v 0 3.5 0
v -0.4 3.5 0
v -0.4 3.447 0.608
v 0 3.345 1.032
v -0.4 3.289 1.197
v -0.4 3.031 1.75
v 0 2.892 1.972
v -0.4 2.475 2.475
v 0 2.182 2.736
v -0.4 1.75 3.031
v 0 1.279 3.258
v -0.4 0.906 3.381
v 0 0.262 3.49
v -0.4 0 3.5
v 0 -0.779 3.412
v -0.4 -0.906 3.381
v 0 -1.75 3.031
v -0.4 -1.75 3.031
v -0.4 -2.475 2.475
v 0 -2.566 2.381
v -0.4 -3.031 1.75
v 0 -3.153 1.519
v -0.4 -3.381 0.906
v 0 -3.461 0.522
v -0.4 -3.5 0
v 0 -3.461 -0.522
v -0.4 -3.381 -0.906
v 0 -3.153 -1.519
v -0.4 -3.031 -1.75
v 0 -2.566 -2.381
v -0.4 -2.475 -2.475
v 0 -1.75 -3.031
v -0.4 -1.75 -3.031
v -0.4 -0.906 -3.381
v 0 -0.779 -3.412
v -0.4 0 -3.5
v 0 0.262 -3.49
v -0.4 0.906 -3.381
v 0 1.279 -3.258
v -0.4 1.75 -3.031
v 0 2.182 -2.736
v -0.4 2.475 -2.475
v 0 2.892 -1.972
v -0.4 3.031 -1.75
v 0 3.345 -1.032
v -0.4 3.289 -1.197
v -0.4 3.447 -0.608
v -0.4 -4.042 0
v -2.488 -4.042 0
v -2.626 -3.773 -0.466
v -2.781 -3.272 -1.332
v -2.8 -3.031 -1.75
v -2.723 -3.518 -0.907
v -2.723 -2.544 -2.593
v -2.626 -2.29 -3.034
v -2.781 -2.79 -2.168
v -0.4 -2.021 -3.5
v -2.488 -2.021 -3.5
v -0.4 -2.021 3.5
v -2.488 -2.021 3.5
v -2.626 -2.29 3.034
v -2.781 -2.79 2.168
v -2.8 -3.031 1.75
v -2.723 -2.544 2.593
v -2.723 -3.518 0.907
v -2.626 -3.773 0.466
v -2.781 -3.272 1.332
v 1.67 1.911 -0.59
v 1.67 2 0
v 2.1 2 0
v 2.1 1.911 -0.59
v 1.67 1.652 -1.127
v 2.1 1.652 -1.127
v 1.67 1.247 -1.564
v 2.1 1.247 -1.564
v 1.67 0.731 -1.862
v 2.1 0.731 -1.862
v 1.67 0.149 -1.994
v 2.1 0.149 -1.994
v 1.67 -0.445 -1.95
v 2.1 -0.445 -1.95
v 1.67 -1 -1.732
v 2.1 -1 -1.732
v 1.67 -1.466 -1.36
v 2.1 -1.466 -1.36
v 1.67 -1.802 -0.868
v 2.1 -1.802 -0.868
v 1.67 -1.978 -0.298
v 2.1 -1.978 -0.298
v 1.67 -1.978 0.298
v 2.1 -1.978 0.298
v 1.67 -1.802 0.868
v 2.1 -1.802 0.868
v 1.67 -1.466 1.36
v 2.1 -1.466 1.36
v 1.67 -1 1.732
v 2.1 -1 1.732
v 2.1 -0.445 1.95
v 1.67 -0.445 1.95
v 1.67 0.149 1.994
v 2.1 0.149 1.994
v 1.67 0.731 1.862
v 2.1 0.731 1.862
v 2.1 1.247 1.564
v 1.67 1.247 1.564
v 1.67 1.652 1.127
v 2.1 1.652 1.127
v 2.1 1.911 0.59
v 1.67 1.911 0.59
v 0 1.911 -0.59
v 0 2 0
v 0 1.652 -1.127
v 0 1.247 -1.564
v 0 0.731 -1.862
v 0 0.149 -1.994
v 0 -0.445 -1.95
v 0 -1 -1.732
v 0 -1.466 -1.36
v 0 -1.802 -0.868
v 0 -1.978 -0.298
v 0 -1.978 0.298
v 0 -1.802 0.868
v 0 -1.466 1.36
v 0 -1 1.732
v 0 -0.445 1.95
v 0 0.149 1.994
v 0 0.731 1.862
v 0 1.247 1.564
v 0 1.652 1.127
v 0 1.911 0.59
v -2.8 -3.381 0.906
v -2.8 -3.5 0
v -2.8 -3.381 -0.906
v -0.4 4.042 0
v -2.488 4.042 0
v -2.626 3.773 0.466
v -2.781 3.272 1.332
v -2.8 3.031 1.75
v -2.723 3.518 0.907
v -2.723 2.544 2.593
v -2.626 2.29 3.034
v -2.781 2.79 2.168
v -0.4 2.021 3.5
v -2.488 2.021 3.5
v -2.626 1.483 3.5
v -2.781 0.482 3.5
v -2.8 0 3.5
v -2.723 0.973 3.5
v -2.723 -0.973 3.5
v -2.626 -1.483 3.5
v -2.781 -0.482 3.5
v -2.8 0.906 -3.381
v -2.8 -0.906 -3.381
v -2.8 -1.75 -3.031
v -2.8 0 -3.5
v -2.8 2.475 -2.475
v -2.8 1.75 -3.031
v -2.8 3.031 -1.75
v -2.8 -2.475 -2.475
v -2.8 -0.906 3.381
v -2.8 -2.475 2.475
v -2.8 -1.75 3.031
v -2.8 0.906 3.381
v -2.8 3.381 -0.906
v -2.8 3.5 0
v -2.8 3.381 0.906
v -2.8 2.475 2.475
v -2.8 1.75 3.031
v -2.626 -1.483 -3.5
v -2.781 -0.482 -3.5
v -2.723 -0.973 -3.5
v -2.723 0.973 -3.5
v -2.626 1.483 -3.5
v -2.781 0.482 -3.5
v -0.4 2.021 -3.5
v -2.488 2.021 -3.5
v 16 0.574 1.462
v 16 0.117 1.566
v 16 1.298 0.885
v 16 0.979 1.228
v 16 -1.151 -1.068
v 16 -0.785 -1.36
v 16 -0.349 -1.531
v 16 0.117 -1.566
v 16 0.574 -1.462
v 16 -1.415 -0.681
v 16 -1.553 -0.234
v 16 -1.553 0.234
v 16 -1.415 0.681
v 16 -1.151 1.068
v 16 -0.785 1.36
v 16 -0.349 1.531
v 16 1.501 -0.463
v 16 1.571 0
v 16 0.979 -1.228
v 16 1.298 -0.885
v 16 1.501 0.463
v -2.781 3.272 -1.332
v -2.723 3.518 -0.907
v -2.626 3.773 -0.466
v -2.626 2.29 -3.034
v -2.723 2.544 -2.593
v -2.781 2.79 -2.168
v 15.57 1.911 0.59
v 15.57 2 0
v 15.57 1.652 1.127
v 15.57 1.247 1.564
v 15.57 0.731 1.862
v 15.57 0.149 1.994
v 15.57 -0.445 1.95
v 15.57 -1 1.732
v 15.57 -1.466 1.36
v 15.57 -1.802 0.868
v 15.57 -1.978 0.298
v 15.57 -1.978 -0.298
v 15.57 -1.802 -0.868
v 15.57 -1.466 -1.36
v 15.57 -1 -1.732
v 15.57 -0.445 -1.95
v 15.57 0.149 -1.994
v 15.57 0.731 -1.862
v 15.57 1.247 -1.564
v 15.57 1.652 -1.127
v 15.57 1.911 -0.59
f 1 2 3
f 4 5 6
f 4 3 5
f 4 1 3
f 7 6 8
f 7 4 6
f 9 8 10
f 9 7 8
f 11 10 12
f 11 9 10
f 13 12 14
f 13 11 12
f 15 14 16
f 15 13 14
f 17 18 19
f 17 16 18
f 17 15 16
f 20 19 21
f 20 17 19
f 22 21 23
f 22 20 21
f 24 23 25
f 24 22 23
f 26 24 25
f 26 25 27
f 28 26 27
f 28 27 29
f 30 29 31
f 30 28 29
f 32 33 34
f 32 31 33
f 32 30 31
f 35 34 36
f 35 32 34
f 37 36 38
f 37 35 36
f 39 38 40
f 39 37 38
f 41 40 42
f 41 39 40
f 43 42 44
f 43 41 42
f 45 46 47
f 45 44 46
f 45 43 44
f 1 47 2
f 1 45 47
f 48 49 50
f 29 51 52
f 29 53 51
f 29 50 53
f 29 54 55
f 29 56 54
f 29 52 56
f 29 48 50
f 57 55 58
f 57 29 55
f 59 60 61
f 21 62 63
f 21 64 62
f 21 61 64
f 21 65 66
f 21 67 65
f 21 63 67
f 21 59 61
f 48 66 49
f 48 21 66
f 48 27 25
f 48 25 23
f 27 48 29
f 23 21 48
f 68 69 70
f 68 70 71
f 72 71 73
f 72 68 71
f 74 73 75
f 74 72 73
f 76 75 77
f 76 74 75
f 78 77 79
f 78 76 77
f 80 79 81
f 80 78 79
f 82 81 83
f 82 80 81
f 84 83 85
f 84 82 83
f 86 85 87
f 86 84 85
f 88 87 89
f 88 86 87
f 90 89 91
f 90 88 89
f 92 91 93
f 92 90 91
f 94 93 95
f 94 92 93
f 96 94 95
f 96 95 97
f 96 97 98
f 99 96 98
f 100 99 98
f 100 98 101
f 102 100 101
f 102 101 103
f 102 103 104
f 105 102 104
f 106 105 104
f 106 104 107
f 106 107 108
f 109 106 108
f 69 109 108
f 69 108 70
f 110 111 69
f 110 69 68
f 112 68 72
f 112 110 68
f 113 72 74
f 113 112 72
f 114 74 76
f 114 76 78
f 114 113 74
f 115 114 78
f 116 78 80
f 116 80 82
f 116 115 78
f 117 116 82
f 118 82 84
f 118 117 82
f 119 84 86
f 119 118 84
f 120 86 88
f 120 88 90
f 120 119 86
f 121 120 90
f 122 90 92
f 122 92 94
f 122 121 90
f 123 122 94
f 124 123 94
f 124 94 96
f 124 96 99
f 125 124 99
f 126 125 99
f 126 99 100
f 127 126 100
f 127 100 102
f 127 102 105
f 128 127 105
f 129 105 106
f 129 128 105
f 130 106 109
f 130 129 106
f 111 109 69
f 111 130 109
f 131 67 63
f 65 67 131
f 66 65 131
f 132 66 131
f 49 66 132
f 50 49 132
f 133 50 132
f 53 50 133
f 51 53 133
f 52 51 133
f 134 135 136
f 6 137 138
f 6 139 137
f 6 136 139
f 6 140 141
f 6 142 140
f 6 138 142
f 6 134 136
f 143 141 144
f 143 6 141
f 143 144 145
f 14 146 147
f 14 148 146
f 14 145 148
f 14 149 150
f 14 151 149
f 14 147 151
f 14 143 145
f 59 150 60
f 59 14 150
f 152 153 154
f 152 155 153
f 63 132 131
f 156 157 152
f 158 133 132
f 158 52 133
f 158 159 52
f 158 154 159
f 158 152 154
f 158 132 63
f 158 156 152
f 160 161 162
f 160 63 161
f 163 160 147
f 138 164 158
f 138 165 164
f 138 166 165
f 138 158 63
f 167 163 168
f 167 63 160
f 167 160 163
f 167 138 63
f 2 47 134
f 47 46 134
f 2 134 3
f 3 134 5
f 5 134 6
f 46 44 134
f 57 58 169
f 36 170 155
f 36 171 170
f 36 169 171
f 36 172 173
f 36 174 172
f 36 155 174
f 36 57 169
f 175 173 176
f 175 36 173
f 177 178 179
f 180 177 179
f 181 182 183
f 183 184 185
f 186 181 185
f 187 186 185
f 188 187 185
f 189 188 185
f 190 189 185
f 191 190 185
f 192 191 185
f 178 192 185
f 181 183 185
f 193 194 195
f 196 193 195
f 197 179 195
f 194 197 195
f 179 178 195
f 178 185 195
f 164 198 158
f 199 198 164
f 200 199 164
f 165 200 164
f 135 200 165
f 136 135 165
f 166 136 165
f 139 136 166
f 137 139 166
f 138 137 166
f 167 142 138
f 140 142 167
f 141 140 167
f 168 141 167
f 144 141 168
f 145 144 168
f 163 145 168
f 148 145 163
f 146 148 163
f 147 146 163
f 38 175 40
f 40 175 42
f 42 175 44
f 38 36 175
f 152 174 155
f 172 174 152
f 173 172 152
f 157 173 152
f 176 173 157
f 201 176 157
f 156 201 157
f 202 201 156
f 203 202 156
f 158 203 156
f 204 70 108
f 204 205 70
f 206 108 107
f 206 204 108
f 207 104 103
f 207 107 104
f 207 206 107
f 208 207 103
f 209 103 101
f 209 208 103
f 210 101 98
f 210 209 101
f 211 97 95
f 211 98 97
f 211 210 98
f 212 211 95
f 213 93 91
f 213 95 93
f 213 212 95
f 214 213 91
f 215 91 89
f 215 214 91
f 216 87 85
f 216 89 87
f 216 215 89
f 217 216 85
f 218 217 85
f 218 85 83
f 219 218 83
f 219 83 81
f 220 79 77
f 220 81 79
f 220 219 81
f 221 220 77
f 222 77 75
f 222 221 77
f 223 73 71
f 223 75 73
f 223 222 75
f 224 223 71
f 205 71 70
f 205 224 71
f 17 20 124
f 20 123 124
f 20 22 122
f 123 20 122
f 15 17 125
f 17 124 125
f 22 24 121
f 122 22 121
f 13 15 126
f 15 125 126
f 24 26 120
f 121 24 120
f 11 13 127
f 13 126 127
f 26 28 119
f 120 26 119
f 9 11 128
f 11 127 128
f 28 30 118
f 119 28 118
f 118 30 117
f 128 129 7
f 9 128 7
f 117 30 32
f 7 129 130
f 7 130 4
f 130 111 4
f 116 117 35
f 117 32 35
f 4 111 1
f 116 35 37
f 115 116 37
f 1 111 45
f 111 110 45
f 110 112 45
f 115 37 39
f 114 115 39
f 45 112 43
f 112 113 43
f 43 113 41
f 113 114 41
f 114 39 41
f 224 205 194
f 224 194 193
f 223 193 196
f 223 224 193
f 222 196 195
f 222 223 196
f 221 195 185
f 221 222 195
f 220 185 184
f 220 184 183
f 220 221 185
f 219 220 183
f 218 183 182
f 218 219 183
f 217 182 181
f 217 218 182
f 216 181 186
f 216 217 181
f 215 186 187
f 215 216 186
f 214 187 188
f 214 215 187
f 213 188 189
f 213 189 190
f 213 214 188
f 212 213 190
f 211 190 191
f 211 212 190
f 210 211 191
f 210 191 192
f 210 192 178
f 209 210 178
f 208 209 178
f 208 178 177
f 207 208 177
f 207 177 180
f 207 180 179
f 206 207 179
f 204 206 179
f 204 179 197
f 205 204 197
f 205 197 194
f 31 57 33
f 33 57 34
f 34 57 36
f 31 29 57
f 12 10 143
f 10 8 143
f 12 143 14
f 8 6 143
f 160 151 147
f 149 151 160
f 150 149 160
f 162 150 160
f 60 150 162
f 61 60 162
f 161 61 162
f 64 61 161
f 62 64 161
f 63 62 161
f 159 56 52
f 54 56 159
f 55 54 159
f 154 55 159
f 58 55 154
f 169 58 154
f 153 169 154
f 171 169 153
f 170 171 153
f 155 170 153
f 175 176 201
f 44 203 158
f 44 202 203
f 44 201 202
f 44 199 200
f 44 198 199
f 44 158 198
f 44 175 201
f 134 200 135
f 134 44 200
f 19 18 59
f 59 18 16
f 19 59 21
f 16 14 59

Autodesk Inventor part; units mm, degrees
ref_plane "YZ Plane" through (0, 0, 0) normal (1, 0, 0) x (0, 1, 0)
ref_plane "XZ Plane" through (0, 0, 0) normal (0, 1, 0) x (-1, 0, 0)
sketch "Sketch1" plane through (0, 0, 0) normal (0, 0, 1) x (1, 0, 0)
  line L0 (0, 3.5) -> (0, 2)
  line L1 (2.1, 2) -> (16, 2)
  line L2 (16, 2) -> (16, 0)
  line L3 (16, 0) -> (-0.4001, 0)
  line L4 (-3.6801, 0) -> (19.28, 0) projected
  line L5 (-0.4001, 0) -> (-0.4001, 3.5)
  line L6 (-0.4001, 3.5) -> (0, 3.5)
  line L7 (2.1, 2) -> (1.6705, 2)
  line L8 (1.6705, 2) -> (0, 2)
  line L9 (0, -0.7) -> (0, 4.2) projected
  dimension "d0" = 16
  dimension "d1" = 13.9
  dimension "d2" = 4
  dimension "d9" = 0.4001
  dimension "d10" = 7
  dimension "d13" = 0.4295
  dimension "d14" = 4
revolve "Body" add sketch "Sketch1" angle 360 about axis through (16, 0, 0) along (-1, 0, 0)
sketch "Sketch2" plane through (-0.4001, 0, 0) normal (-1, 0, 0) x (0, 0, 1)
  line L0 (0, 4.0415) -> (3.5, 2.0207)
  line L1 (3.5, 2.0207) -> (3.5, -2.0207)
  line L2 (3.5, -2.0207) -> (0, -4.0415)
  line L3 (0, -4.0415) -> (-3.5, -2.0207)
  line L4 (-3.5, -2.0207) -> (-3.5, 2.0207)
  line L5 (-3.5, 2.0207) -> (0, 4.0415)
  point P0 (0, 0)
  point P1 (0, 0)
  dimension "d11" = 7
extrude "Head" add sketch "Sketch2" along normal blind 2.4
sketch "Sketch4" plane through (0, 0, 0) normal (0, 0, 1) x (1, 0, 0)
  line L0 (-2.8001, 3.5) -> (-2.8001, 4.0415)
  line L1 (-2.8001, 4.0415) -> (-2.4875, 4.0415)
  line L2 (-2.4875, 4.0415) -> (-2.8001, 3.5)
  line L3 (-3.2801, 0) -> (0.0799, 0) projected
  line L4 (-0.4001, 4.0415) -> (-2.8001, 4.0415) projected
  line L5 (-2.8001, 2.0207) -> (-2.8001, 4.0415) projected
  dimension "d5" = 30
  dimension "d19" = 7
revolve "Chamfer1" cut sketch "Sketch4" angle 360 about axis through (-10, 0, 0) along (1, 0, 0)
thread "Thread" size "M4x0.7" class "6g" standard "ISO Metric profile" length 13.9
chamfer "Chamfer2" distance 0.4294 distance2 0.4295 1 edges at (16, -2, 0) measured on face at (16, 0.6473, -0.1595)
ref_plane "Work Plane1" through (1.525, 0, 0) normal (0, 0, 1) x (1, 0, 0)
equation "\"d0\" = NLG"
equation "\"d1\" = GEL"
equation "\"d2\" = GD"
equation "\"d10\" = SD2"
equation "\"d14\" = BDM"
equation "\"d11\" = SW"
equation "\"d3\" = KOH - SD"
equation "\"d5\" = ANG1"
equation "\"d19\" = SW0"
equation "\"d15\" = GEL"
equation "\"d6\" = -0.5 * SPD + 0.5 * GD"
equation "\"NLG\" = 16"
equation "\"GD\" = NND"
equation "\"BDM\" = NND"
equation "\"KOH\" = 2.8"
equation "\"GEL\" = 13.9"
equation "\"SW\" = 7"
equation "\"SW0\" = SW"
equation "\"SPD\" = NND - 1.2269 * PTC"
equation "\"SD2\" = SW"
equation "\"SD\" = 0.4"
equation "\"ANG1\" = 30deg"
equation "\"GAL\" = 0.61345 * PTC"
equation "\"GUL\" = 0.61345 * PTC"
equation "\"RR\" = 0.2"
equation "\"WFT\" = SD"
equation "\"GD1\" = THREADDIA - 1.2269 * PTC"
equation "\"THREADDIA\" = 4"
equation "\"SDH\" = SW"
equation "\"TOA\" = 30deg"
equation "\"FAWI\" = 45deg"
equation "\"PTC\" = 0.7"
equation "\"NND\" = 4"
equation "\"E0\" = 1.155 * SW"
properties part number "AS 1110 - M4 x 16" material "Steel, Mild"
